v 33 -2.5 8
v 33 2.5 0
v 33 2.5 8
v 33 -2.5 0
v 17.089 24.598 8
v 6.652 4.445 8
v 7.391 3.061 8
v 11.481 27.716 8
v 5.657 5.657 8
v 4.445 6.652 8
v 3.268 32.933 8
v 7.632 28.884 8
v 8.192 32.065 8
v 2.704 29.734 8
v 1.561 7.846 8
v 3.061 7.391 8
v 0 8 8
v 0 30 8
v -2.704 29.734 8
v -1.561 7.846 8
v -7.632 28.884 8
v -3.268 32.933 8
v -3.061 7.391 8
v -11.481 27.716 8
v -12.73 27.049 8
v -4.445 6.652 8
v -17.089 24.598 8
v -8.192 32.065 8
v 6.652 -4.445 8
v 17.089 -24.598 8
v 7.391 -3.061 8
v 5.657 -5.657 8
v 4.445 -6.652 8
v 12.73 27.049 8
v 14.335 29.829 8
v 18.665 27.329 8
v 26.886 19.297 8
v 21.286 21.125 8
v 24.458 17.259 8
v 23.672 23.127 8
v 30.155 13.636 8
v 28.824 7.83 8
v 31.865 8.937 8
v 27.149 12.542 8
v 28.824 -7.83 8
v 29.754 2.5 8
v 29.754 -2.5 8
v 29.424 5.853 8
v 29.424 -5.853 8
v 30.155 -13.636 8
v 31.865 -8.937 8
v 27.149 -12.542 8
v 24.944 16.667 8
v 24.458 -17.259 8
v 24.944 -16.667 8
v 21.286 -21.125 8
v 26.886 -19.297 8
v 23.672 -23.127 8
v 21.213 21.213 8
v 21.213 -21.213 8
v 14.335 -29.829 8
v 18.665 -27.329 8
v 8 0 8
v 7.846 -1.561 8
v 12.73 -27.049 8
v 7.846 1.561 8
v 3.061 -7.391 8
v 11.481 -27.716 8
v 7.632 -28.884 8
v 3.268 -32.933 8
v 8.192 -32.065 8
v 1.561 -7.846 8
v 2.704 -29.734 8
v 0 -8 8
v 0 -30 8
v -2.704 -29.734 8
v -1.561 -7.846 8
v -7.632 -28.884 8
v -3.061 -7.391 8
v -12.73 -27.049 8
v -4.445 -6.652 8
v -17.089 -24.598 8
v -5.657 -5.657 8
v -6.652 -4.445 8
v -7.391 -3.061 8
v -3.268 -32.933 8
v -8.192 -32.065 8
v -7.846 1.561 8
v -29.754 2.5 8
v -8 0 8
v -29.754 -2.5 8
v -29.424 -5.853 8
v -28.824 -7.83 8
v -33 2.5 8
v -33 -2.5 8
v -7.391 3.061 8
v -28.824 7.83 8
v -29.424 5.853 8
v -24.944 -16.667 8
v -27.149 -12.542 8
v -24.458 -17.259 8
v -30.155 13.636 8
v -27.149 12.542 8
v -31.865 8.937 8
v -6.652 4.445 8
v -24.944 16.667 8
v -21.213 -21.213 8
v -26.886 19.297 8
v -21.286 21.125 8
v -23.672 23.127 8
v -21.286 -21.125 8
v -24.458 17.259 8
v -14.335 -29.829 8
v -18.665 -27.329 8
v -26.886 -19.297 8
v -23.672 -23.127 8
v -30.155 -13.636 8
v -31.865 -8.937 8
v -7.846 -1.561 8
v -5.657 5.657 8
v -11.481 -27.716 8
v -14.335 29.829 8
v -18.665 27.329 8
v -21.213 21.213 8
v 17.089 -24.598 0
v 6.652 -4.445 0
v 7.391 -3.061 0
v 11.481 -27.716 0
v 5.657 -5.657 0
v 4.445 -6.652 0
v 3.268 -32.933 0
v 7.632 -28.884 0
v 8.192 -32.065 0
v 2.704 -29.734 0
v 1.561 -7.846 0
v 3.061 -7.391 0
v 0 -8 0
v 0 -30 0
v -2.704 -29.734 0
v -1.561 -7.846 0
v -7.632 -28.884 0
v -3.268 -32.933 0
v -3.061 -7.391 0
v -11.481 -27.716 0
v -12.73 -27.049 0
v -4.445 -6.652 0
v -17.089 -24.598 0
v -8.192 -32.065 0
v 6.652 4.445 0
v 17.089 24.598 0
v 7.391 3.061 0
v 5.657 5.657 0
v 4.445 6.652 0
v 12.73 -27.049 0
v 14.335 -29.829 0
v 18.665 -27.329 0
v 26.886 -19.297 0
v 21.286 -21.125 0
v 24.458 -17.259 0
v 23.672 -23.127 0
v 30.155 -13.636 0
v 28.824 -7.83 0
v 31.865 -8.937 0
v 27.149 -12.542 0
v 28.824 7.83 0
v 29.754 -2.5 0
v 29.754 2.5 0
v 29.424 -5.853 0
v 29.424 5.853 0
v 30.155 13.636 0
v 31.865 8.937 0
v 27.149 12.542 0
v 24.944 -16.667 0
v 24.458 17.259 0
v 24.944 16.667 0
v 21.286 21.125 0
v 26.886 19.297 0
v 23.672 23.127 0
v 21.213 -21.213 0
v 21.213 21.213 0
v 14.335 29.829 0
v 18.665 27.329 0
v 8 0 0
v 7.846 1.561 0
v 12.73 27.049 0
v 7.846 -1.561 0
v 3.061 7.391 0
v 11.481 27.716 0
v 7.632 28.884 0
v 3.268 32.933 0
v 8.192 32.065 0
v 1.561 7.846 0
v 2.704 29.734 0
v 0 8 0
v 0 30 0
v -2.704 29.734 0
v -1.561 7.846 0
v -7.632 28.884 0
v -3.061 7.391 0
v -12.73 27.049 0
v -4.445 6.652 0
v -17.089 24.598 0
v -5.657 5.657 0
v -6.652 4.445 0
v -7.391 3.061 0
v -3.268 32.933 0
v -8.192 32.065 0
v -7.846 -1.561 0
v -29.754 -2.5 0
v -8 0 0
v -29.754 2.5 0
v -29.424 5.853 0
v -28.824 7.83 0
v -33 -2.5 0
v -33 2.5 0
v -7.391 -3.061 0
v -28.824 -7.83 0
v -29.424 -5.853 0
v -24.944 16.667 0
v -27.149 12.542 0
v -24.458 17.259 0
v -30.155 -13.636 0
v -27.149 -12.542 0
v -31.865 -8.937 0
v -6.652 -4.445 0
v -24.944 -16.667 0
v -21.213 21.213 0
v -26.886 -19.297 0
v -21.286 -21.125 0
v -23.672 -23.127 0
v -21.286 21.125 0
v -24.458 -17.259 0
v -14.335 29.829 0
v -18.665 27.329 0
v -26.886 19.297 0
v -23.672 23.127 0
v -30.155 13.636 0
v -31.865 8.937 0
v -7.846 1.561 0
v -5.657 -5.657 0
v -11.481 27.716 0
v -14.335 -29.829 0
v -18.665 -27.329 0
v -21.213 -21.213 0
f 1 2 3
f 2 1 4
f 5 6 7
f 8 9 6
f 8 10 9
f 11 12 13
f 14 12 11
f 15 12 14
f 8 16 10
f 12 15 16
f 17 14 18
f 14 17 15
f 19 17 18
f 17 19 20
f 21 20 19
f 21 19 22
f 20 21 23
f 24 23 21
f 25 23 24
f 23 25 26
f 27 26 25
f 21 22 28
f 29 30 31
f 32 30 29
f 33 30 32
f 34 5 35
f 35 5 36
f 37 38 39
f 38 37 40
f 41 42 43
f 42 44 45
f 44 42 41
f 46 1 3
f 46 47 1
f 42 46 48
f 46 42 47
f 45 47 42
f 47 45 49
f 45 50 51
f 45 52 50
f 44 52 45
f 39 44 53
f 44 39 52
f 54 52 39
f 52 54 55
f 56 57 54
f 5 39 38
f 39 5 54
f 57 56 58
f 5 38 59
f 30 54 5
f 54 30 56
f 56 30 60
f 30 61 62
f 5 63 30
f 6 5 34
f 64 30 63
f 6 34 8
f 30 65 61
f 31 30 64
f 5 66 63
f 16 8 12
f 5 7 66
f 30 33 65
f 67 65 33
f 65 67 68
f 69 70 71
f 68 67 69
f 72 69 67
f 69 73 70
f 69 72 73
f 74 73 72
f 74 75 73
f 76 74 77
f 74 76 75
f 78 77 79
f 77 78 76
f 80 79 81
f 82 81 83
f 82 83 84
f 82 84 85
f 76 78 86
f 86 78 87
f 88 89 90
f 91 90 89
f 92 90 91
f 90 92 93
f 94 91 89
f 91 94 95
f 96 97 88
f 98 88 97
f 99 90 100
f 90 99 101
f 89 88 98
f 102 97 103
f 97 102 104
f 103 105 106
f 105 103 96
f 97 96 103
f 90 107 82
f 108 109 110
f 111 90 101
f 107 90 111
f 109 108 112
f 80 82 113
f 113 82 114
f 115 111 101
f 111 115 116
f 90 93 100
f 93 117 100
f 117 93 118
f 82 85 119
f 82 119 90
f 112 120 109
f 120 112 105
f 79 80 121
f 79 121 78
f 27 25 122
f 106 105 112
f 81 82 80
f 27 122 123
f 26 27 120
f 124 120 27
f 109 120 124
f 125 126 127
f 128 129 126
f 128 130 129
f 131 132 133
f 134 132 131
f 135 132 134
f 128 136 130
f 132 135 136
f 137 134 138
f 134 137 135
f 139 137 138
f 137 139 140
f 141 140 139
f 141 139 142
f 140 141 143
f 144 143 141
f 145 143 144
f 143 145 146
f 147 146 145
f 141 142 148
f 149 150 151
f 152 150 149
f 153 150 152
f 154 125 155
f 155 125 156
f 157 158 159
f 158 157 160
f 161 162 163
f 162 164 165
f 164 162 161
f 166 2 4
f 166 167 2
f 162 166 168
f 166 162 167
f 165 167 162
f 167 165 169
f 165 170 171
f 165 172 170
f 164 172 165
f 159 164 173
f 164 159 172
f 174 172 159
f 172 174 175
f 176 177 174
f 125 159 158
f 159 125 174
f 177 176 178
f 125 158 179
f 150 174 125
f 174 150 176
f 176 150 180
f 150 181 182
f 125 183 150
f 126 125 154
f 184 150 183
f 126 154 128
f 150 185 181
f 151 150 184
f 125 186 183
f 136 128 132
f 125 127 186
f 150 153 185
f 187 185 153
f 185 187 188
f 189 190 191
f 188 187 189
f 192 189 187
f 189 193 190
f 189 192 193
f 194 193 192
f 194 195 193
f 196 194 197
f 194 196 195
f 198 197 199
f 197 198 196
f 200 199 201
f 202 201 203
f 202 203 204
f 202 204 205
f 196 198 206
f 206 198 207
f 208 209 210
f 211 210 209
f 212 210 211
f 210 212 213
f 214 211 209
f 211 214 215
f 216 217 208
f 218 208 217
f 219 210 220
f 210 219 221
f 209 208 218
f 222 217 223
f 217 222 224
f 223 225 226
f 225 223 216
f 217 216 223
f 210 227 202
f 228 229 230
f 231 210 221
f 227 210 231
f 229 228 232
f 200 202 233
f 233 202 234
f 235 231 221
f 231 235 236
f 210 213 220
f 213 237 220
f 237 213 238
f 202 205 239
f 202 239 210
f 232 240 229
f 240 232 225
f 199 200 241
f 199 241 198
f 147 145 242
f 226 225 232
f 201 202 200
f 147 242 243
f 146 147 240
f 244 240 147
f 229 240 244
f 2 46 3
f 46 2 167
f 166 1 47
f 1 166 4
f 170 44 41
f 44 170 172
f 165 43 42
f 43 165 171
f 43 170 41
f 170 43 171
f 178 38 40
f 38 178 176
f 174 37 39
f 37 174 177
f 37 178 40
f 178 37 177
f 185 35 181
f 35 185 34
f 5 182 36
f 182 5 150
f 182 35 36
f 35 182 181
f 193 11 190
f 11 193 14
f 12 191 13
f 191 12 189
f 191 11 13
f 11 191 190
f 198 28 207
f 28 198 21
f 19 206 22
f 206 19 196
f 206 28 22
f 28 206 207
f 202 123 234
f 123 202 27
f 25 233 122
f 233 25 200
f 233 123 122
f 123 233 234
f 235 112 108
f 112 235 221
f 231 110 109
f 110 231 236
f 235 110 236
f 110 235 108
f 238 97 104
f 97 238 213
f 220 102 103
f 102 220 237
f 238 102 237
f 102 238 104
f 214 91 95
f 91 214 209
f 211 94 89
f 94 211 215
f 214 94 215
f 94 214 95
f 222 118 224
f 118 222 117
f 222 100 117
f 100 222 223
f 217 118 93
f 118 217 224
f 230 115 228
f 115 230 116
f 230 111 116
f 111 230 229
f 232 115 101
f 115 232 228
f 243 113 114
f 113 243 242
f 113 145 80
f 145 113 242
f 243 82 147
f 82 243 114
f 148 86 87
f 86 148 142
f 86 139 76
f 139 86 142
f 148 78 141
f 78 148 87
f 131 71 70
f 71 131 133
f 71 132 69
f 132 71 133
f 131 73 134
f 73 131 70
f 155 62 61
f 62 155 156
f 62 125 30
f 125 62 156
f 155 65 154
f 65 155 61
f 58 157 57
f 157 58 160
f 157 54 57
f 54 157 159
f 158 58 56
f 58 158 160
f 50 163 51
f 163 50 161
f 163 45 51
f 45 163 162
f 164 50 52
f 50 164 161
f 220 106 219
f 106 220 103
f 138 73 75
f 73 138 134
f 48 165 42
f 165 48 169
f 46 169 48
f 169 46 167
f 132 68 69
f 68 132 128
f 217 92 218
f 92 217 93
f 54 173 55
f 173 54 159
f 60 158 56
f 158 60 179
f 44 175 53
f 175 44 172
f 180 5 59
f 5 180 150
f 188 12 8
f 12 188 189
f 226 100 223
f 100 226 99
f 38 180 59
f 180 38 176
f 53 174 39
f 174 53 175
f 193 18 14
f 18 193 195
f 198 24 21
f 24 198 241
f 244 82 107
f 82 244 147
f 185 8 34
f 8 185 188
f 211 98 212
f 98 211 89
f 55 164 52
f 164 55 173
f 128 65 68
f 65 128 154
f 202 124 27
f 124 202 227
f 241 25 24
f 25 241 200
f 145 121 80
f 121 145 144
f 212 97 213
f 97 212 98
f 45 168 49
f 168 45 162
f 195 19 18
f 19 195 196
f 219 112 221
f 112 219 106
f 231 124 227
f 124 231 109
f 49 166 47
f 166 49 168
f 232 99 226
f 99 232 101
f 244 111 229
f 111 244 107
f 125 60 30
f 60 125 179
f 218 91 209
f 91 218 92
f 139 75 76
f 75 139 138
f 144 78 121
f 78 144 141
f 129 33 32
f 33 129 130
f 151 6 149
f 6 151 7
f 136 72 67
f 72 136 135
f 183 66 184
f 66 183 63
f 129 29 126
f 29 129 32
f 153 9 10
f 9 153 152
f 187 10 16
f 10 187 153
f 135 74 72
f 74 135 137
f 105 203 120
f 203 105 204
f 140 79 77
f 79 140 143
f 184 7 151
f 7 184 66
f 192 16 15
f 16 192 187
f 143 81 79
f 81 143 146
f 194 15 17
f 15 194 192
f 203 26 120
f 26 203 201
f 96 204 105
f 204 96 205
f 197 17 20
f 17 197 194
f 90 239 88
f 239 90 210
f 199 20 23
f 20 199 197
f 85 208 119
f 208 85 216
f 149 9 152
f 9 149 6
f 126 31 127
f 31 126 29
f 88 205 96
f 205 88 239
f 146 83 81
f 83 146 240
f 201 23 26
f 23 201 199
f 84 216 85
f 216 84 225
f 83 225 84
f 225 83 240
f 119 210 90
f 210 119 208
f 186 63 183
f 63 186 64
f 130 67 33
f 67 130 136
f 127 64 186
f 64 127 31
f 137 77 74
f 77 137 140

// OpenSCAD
$fn = 32;

// ----------------------------------------------------------------------
// Spur blank: bored gear blank
// ----------------------------------------------------------------------

// --- parameters (mm) ---
disc_r = 30;              // blank root radius
disc_t = 8;               // blank thickness
n_teeth = 18;             // stub tooth count
tooth_w = 5;              // tooth width at the root
tooth_h = 3;              // tooth height above the root
bore_r = 8;               // central bore radius

out_r = disc_r + tooth_h;  // tip radius
bbox_x = 66.0;  // measured width over the teeth
bbox_y = 65.87;  // measured depth over the teeth

difference() {
union() {
  cylinder(r = disc_r, h = disc_t);
  for (i = [0 : n_teeth - 1])
    rotate([0, 0, i * 360 / n_teeth])
      translate([disc_r - 1, -tooth_w / 2, 0])
        cube([tooth_h + 1, tooth_w, disc_t]);
}
  translate([0, 0, -1]) cylinder(r = bore_r, h = disc_t + 2);
}
